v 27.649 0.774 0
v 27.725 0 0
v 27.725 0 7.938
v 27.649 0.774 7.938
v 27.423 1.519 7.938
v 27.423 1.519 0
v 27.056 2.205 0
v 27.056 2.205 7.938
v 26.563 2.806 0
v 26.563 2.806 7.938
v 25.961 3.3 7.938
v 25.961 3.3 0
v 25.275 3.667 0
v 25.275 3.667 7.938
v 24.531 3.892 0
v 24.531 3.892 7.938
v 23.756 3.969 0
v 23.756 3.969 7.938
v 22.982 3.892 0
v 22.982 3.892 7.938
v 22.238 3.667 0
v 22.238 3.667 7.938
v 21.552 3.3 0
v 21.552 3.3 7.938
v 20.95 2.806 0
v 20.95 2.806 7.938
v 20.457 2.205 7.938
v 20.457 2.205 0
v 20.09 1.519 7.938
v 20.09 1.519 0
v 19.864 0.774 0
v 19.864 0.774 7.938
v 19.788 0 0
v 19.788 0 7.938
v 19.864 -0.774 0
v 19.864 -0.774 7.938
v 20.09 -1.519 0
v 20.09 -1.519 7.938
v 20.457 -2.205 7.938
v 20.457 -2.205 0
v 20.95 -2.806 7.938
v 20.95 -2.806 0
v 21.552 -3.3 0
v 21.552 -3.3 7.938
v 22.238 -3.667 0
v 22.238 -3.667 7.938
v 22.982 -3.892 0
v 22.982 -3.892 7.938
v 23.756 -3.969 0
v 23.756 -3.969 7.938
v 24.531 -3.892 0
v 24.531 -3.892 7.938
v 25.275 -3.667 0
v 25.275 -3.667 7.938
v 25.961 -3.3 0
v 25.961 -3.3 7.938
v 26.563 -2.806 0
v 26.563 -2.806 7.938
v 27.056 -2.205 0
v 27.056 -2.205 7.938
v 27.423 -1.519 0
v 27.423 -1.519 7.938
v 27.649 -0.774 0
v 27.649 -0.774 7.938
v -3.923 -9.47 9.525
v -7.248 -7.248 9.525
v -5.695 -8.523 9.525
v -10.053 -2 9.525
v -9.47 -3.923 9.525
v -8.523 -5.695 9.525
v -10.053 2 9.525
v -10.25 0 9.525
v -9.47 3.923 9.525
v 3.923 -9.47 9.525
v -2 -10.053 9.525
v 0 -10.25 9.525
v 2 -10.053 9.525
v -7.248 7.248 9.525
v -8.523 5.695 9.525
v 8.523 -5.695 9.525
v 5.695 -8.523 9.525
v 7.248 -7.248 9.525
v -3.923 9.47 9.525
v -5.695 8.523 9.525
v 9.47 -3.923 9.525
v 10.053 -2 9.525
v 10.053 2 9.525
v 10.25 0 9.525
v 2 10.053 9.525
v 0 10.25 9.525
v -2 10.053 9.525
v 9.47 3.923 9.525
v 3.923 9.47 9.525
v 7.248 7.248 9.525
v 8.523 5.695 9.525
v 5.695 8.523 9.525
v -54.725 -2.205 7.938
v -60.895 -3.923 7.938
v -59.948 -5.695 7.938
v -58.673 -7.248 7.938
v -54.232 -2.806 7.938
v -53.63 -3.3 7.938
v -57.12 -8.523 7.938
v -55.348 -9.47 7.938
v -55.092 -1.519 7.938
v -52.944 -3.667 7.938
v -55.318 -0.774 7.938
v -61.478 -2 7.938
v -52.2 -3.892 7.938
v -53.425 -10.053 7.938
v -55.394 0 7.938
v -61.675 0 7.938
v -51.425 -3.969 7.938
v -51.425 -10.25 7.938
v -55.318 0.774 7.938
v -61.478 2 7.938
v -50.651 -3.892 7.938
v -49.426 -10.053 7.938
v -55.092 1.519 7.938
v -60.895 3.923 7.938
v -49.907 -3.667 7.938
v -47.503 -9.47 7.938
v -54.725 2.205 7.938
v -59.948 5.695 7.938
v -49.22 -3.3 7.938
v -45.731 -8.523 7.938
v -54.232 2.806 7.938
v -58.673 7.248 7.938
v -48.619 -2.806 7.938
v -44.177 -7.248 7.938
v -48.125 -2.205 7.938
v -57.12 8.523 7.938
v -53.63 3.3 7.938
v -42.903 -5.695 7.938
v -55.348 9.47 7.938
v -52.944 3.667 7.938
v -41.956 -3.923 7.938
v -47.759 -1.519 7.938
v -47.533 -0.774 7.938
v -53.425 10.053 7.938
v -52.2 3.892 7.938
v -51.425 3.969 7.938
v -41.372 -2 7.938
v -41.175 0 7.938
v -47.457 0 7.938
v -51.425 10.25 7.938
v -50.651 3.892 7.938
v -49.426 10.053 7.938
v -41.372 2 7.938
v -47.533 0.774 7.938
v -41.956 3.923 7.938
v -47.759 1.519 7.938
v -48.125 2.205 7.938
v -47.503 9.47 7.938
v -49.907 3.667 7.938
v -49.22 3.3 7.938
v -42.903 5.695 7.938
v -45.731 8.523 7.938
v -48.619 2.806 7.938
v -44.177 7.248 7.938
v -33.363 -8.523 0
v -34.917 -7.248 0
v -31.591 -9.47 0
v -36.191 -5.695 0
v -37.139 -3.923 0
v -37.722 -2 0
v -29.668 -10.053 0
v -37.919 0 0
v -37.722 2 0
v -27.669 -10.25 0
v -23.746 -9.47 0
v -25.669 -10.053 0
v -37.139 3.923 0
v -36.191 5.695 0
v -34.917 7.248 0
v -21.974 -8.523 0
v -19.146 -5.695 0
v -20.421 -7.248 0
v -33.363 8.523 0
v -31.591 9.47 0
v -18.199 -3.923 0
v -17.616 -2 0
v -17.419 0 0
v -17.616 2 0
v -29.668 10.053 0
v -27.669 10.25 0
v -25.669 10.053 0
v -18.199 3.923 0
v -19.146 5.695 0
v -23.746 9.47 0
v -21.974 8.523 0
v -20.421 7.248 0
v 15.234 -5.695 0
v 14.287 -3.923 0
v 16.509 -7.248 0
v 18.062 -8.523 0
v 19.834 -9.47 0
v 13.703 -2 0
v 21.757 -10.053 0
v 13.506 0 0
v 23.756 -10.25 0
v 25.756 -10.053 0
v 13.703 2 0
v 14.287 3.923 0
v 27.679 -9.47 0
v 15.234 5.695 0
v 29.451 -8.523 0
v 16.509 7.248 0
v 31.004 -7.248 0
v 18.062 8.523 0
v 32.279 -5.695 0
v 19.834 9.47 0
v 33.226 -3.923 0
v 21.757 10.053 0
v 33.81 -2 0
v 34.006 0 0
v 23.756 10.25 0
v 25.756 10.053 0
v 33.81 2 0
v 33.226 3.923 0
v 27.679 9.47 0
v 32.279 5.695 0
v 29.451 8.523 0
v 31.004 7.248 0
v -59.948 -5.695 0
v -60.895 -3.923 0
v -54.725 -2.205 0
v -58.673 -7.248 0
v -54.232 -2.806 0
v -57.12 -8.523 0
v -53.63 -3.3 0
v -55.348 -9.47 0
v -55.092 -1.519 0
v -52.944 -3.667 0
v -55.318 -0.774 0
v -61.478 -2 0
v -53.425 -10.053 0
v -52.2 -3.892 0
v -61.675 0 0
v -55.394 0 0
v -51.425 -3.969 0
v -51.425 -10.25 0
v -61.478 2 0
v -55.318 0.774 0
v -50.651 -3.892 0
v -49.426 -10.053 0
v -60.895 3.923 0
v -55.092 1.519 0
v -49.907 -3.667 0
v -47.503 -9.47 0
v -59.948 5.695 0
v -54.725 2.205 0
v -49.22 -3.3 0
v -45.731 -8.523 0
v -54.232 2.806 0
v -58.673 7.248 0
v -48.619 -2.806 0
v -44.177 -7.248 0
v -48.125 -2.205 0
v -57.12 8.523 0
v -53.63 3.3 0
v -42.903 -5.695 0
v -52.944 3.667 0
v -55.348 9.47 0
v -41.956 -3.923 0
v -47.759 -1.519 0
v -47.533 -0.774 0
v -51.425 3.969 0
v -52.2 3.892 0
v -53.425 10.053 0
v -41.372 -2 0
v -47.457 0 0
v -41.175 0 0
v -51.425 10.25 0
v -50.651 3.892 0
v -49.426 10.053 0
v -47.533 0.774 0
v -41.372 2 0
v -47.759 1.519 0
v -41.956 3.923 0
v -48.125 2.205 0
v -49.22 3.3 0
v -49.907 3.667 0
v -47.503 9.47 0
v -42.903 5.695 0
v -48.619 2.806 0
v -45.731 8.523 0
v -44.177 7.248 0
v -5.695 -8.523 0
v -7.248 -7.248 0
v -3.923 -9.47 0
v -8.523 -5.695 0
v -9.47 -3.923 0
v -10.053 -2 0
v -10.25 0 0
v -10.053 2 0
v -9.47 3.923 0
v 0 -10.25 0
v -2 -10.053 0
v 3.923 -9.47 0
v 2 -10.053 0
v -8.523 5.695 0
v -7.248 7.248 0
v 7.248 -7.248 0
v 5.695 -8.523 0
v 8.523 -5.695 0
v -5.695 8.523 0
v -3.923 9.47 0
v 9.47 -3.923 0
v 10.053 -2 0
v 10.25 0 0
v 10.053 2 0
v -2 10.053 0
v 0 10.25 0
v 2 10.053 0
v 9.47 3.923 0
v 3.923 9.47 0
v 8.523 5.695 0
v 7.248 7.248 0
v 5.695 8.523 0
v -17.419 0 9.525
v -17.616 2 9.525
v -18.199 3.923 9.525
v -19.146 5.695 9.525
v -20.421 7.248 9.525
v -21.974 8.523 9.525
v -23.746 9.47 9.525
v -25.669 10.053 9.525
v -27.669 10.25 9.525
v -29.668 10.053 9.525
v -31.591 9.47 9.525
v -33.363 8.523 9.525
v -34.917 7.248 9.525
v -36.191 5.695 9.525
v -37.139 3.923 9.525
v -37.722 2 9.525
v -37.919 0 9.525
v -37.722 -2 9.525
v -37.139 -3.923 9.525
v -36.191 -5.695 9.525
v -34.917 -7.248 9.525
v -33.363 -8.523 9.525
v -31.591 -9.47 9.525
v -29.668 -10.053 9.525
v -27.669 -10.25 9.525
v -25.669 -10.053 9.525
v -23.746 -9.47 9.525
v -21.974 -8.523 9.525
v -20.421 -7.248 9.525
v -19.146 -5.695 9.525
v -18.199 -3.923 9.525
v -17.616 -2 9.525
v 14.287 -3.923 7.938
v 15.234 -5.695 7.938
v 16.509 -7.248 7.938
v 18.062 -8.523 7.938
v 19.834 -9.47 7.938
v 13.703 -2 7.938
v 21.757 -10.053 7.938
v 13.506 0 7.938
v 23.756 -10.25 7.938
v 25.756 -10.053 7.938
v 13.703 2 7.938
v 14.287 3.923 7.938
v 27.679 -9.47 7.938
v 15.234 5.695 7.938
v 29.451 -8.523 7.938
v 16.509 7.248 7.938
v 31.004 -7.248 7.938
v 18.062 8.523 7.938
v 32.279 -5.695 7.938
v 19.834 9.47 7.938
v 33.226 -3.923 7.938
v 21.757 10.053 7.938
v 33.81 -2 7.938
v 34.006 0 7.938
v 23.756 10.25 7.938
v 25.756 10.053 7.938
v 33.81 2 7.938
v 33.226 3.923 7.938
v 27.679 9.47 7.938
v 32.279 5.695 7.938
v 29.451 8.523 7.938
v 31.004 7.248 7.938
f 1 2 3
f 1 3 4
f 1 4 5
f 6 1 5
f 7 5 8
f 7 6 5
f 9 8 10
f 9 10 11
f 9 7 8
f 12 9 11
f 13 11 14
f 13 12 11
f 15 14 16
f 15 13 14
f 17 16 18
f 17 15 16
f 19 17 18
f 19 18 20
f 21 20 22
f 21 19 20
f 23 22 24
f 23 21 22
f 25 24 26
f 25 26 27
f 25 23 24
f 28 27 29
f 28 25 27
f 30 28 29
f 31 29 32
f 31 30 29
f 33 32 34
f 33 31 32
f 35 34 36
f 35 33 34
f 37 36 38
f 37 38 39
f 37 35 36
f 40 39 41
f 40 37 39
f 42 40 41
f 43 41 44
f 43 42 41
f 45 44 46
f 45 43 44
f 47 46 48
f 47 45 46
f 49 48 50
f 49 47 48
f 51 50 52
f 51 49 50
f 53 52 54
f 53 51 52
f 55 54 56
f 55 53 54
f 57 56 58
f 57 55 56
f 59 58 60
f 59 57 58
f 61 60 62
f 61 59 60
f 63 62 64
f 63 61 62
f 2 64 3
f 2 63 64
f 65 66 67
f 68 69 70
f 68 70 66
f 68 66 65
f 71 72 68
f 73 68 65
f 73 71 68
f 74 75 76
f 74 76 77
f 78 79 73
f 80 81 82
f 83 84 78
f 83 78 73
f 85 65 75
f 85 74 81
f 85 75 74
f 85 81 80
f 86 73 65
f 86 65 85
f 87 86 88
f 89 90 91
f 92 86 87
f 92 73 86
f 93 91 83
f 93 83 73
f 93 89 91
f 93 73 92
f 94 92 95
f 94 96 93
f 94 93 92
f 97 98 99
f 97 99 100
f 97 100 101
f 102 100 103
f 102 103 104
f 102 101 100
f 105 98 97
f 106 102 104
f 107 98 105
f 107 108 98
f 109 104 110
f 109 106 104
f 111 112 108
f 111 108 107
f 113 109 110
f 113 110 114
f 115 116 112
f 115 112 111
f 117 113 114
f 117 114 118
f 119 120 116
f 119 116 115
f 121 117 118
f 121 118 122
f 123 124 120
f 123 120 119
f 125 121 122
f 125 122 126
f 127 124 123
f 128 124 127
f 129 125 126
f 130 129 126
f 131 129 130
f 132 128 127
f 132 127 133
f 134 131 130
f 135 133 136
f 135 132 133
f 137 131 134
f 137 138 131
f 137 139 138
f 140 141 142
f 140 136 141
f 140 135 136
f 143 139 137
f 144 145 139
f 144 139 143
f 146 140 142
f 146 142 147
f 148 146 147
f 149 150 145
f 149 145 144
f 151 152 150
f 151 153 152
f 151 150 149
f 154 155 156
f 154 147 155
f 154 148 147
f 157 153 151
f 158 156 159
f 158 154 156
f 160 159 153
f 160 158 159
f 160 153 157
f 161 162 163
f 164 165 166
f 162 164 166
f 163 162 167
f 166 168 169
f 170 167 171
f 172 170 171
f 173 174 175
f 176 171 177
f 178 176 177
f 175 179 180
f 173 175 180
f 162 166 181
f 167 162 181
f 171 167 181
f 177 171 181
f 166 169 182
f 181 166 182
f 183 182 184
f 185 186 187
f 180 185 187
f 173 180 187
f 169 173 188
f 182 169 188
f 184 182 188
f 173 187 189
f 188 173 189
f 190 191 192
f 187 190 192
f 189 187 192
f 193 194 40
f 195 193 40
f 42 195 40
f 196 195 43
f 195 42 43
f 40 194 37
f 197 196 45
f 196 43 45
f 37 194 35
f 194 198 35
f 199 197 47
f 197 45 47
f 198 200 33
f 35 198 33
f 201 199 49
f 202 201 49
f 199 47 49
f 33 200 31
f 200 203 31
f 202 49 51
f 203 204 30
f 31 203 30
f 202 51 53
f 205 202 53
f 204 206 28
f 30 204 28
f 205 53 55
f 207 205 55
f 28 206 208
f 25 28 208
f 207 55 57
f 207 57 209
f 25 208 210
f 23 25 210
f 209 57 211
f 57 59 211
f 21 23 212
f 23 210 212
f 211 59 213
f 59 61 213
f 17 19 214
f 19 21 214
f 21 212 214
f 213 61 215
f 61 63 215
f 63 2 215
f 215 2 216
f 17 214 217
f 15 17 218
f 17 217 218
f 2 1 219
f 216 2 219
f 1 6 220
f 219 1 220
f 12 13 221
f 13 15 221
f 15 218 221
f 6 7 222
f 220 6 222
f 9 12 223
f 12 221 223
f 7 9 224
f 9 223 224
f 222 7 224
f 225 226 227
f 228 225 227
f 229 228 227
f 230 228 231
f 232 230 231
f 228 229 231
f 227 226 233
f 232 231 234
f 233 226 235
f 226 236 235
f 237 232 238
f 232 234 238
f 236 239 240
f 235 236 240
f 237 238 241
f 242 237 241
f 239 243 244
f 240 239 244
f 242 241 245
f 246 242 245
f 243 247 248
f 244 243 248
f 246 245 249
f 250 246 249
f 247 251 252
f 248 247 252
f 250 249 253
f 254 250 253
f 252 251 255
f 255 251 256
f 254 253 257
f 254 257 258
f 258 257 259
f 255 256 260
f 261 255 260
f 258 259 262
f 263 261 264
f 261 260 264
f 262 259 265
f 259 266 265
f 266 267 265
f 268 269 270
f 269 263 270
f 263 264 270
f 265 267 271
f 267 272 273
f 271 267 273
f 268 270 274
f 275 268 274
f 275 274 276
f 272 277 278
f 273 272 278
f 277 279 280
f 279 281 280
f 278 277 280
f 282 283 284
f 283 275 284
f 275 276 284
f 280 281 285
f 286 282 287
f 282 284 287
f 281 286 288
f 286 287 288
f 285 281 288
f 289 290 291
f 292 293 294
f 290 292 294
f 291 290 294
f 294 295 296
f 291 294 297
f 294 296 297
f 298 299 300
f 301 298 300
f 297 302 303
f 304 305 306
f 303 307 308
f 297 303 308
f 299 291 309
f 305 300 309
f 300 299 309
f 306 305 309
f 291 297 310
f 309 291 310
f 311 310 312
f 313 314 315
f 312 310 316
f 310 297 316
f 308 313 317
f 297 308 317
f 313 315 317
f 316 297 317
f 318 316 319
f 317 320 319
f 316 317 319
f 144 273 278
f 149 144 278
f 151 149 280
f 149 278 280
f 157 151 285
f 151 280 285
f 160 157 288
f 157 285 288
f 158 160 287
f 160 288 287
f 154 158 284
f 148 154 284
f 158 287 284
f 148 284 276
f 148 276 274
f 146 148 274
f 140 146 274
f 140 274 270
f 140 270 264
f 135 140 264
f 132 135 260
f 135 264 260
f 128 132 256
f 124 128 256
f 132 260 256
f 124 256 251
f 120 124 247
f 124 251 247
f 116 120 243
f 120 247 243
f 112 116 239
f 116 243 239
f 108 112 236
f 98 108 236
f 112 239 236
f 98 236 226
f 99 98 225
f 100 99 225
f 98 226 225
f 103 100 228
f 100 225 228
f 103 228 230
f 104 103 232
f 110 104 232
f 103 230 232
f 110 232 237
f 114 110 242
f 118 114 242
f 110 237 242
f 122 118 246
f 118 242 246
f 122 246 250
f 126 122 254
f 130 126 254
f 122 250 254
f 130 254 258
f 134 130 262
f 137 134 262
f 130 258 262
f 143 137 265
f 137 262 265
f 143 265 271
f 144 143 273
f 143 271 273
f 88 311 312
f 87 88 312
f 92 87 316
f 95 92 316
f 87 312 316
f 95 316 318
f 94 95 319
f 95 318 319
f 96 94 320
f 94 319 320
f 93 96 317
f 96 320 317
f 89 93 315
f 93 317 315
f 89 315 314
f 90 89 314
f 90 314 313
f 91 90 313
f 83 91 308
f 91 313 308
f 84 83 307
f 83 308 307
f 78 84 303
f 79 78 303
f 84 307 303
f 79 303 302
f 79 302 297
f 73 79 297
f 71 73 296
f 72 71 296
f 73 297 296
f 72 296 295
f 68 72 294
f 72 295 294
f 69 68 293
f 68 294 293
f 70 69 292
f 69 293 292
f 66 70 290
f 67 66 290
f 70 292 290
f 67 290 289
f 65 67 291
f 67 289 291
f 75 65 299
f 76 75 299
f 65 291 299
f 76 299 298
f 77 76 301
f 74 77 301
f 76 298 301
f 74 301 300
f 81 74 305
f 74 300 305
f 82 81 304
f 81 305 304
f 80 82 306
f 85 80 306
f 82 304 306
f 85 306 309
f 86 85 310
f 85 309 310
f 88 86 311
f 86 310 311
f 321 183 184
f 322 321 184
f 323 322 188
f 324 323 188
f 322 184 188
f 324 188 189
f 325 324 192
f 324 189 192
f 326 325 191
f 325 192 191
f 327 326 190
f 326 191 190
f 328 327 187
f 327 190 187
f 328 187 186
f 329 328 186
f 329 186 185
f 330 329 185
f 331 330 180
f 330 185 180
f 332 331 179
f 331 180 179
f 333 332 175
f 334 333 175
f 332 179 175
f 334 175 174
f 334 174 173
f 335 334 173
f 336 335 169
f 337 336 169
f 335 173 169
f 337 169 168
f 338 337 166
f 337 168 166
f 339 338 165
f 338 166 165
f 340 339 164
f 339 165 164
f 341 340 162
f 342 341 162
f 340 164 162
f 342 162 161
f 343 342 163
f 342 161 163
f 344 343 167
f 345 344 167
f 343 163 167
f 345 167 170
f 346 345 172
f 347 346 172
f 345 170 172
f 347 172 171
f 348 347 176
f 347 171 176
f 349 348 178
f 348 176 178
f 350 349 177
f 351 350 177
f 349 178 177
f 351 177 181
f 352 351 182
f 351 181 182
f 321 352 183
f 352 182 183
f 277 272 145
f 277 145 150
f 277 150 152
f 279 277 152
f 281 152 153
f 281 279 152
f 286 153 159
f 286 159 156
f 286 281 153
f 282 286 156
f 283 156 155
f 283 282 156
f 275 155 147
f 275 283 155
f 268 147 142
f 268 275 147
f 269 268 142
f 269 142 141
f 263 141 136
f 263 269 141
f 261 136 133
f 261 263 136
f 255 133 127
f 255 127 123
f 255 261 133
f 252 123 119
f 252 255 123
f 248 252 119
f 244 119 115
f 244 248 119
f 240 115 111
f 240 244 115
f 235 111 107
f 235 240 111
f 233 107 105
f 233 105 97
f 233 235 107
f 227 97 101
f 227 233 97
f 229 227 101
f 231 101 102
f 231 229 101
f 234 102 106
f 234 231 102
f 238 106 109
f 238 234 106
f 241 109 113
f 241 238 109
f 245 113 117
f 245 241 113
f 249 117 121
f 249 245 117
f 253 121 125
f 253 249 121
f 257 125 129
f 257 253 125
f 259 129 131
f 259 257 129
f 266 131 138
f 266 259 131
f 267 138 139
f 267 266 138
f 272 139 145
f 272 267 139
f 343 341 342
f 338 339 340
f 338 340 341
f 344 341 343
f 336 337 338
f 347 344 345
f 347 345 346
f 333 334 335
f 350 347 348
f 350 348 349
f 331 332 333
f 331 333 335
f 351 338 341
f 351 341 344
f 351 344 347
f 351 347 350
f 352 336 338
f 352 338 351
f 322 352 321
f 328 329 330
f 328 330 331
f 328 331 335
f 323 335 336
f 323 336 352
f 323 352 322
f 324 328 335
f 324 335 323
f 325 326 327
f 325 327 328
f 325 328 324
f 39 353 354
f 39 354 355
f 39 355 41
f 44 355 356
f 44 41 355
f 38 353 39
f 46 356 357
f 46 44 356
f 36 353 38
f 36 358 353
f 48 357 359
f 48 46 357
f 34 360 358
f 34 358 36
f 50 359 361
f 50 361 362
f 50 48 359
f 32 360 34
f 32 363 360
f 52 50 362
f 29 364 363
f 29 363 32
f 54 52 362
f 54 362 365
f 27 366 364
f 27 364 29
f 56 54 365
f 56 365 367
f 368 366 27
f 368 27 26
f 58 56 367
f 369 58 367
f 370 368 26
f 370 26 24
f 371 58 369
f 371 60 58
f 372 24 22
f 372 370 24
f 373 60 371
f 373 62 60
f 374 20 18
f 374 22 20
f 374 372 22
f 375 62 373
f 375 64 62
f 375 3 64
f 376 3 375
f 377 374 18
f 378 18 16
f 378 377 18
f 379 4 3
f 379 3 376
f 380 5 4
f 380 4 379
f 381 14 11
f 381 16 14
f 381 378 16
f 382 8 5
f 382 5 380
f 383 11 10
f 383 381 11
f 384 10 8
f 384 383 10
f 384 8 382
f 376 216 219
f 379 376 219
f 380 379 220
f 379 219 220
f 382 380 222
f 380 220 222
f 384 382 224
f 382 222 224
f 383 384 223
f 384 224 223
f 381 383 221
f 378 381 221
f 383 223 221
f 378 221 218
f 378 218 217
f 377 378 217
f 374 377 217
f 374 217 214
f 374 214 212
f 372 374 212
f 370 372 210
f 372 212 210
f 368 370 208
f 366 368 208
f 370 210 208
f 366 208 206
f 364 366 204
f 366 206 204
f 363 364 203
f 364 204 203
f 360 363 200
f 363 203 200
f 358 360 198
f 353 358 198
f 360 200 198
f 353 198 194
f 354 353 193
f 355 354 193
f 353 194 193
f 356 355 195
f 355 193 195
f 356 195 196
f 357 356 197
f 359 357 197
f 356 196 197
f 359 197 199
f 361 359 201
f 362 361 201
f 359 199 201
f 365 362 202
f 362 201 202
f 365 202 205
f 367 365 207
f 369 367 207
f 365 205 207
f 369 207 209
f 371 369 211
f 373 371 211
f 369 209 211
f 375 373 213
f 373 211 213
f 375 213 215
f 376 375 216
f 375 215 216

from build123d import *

# Parameters (mm, degrees)
F0_R     = 10.25
F1_DEPTH = 9.525
F0_R_2   = 3.96875
F2_DEPTH = 7.9375


# Not quite as in the source:
# - a length typed as a fraction of an inch, garbled in the dataset ("3 / 203.2 mm" for 3/8 in), is restored
# - a feature names something its author has since deleted; it is built from what else it names


with BuildPart() as f1:
    # F0 (on Top) → F1 (new body)
    with BuildSketch(Plane.XY):
        Circle(F0_R)
    extrude(amount=F1_DEPTH)


with BuildPart() as f1b:
    # F0 (on Top) → F1, piece 2 (new body)
    with BuildSketch(Plane.XY):
        with Locations((-27.6688113809, 0)):
            Circle(F0_R)
    extrude(amount=F1_DEPTH)


with BuildPart() as f2:
    # F0 (on Top) → F2 (new body)
    with BuildSketch(Plane.XY):
        with Locations((-51.425293088, 0)):
            Circle(F0_R)
        with Locations((-51.425293088, 0)):
            Circle(F0_R_2, mode=Mode.SUBTRACT)
    extrude(amount=F2_DEPTH)


with BuildPart() as f2b:
    # F0 (on Top) → F2, piece 2 (new body)
    with BuildSketch(Plane.XY):
        with Locations((23.7564817071, 0)):
            Circle(F0_R)
        with Locations((23.7564817071, 0)):
            Circle(F0_R_2, mode=Mode.SUBTRACT)
    extrude(amount=F2_DEPTH)


solid = Compound([f1.part, f1b.part, f2.part, f2b.part])
